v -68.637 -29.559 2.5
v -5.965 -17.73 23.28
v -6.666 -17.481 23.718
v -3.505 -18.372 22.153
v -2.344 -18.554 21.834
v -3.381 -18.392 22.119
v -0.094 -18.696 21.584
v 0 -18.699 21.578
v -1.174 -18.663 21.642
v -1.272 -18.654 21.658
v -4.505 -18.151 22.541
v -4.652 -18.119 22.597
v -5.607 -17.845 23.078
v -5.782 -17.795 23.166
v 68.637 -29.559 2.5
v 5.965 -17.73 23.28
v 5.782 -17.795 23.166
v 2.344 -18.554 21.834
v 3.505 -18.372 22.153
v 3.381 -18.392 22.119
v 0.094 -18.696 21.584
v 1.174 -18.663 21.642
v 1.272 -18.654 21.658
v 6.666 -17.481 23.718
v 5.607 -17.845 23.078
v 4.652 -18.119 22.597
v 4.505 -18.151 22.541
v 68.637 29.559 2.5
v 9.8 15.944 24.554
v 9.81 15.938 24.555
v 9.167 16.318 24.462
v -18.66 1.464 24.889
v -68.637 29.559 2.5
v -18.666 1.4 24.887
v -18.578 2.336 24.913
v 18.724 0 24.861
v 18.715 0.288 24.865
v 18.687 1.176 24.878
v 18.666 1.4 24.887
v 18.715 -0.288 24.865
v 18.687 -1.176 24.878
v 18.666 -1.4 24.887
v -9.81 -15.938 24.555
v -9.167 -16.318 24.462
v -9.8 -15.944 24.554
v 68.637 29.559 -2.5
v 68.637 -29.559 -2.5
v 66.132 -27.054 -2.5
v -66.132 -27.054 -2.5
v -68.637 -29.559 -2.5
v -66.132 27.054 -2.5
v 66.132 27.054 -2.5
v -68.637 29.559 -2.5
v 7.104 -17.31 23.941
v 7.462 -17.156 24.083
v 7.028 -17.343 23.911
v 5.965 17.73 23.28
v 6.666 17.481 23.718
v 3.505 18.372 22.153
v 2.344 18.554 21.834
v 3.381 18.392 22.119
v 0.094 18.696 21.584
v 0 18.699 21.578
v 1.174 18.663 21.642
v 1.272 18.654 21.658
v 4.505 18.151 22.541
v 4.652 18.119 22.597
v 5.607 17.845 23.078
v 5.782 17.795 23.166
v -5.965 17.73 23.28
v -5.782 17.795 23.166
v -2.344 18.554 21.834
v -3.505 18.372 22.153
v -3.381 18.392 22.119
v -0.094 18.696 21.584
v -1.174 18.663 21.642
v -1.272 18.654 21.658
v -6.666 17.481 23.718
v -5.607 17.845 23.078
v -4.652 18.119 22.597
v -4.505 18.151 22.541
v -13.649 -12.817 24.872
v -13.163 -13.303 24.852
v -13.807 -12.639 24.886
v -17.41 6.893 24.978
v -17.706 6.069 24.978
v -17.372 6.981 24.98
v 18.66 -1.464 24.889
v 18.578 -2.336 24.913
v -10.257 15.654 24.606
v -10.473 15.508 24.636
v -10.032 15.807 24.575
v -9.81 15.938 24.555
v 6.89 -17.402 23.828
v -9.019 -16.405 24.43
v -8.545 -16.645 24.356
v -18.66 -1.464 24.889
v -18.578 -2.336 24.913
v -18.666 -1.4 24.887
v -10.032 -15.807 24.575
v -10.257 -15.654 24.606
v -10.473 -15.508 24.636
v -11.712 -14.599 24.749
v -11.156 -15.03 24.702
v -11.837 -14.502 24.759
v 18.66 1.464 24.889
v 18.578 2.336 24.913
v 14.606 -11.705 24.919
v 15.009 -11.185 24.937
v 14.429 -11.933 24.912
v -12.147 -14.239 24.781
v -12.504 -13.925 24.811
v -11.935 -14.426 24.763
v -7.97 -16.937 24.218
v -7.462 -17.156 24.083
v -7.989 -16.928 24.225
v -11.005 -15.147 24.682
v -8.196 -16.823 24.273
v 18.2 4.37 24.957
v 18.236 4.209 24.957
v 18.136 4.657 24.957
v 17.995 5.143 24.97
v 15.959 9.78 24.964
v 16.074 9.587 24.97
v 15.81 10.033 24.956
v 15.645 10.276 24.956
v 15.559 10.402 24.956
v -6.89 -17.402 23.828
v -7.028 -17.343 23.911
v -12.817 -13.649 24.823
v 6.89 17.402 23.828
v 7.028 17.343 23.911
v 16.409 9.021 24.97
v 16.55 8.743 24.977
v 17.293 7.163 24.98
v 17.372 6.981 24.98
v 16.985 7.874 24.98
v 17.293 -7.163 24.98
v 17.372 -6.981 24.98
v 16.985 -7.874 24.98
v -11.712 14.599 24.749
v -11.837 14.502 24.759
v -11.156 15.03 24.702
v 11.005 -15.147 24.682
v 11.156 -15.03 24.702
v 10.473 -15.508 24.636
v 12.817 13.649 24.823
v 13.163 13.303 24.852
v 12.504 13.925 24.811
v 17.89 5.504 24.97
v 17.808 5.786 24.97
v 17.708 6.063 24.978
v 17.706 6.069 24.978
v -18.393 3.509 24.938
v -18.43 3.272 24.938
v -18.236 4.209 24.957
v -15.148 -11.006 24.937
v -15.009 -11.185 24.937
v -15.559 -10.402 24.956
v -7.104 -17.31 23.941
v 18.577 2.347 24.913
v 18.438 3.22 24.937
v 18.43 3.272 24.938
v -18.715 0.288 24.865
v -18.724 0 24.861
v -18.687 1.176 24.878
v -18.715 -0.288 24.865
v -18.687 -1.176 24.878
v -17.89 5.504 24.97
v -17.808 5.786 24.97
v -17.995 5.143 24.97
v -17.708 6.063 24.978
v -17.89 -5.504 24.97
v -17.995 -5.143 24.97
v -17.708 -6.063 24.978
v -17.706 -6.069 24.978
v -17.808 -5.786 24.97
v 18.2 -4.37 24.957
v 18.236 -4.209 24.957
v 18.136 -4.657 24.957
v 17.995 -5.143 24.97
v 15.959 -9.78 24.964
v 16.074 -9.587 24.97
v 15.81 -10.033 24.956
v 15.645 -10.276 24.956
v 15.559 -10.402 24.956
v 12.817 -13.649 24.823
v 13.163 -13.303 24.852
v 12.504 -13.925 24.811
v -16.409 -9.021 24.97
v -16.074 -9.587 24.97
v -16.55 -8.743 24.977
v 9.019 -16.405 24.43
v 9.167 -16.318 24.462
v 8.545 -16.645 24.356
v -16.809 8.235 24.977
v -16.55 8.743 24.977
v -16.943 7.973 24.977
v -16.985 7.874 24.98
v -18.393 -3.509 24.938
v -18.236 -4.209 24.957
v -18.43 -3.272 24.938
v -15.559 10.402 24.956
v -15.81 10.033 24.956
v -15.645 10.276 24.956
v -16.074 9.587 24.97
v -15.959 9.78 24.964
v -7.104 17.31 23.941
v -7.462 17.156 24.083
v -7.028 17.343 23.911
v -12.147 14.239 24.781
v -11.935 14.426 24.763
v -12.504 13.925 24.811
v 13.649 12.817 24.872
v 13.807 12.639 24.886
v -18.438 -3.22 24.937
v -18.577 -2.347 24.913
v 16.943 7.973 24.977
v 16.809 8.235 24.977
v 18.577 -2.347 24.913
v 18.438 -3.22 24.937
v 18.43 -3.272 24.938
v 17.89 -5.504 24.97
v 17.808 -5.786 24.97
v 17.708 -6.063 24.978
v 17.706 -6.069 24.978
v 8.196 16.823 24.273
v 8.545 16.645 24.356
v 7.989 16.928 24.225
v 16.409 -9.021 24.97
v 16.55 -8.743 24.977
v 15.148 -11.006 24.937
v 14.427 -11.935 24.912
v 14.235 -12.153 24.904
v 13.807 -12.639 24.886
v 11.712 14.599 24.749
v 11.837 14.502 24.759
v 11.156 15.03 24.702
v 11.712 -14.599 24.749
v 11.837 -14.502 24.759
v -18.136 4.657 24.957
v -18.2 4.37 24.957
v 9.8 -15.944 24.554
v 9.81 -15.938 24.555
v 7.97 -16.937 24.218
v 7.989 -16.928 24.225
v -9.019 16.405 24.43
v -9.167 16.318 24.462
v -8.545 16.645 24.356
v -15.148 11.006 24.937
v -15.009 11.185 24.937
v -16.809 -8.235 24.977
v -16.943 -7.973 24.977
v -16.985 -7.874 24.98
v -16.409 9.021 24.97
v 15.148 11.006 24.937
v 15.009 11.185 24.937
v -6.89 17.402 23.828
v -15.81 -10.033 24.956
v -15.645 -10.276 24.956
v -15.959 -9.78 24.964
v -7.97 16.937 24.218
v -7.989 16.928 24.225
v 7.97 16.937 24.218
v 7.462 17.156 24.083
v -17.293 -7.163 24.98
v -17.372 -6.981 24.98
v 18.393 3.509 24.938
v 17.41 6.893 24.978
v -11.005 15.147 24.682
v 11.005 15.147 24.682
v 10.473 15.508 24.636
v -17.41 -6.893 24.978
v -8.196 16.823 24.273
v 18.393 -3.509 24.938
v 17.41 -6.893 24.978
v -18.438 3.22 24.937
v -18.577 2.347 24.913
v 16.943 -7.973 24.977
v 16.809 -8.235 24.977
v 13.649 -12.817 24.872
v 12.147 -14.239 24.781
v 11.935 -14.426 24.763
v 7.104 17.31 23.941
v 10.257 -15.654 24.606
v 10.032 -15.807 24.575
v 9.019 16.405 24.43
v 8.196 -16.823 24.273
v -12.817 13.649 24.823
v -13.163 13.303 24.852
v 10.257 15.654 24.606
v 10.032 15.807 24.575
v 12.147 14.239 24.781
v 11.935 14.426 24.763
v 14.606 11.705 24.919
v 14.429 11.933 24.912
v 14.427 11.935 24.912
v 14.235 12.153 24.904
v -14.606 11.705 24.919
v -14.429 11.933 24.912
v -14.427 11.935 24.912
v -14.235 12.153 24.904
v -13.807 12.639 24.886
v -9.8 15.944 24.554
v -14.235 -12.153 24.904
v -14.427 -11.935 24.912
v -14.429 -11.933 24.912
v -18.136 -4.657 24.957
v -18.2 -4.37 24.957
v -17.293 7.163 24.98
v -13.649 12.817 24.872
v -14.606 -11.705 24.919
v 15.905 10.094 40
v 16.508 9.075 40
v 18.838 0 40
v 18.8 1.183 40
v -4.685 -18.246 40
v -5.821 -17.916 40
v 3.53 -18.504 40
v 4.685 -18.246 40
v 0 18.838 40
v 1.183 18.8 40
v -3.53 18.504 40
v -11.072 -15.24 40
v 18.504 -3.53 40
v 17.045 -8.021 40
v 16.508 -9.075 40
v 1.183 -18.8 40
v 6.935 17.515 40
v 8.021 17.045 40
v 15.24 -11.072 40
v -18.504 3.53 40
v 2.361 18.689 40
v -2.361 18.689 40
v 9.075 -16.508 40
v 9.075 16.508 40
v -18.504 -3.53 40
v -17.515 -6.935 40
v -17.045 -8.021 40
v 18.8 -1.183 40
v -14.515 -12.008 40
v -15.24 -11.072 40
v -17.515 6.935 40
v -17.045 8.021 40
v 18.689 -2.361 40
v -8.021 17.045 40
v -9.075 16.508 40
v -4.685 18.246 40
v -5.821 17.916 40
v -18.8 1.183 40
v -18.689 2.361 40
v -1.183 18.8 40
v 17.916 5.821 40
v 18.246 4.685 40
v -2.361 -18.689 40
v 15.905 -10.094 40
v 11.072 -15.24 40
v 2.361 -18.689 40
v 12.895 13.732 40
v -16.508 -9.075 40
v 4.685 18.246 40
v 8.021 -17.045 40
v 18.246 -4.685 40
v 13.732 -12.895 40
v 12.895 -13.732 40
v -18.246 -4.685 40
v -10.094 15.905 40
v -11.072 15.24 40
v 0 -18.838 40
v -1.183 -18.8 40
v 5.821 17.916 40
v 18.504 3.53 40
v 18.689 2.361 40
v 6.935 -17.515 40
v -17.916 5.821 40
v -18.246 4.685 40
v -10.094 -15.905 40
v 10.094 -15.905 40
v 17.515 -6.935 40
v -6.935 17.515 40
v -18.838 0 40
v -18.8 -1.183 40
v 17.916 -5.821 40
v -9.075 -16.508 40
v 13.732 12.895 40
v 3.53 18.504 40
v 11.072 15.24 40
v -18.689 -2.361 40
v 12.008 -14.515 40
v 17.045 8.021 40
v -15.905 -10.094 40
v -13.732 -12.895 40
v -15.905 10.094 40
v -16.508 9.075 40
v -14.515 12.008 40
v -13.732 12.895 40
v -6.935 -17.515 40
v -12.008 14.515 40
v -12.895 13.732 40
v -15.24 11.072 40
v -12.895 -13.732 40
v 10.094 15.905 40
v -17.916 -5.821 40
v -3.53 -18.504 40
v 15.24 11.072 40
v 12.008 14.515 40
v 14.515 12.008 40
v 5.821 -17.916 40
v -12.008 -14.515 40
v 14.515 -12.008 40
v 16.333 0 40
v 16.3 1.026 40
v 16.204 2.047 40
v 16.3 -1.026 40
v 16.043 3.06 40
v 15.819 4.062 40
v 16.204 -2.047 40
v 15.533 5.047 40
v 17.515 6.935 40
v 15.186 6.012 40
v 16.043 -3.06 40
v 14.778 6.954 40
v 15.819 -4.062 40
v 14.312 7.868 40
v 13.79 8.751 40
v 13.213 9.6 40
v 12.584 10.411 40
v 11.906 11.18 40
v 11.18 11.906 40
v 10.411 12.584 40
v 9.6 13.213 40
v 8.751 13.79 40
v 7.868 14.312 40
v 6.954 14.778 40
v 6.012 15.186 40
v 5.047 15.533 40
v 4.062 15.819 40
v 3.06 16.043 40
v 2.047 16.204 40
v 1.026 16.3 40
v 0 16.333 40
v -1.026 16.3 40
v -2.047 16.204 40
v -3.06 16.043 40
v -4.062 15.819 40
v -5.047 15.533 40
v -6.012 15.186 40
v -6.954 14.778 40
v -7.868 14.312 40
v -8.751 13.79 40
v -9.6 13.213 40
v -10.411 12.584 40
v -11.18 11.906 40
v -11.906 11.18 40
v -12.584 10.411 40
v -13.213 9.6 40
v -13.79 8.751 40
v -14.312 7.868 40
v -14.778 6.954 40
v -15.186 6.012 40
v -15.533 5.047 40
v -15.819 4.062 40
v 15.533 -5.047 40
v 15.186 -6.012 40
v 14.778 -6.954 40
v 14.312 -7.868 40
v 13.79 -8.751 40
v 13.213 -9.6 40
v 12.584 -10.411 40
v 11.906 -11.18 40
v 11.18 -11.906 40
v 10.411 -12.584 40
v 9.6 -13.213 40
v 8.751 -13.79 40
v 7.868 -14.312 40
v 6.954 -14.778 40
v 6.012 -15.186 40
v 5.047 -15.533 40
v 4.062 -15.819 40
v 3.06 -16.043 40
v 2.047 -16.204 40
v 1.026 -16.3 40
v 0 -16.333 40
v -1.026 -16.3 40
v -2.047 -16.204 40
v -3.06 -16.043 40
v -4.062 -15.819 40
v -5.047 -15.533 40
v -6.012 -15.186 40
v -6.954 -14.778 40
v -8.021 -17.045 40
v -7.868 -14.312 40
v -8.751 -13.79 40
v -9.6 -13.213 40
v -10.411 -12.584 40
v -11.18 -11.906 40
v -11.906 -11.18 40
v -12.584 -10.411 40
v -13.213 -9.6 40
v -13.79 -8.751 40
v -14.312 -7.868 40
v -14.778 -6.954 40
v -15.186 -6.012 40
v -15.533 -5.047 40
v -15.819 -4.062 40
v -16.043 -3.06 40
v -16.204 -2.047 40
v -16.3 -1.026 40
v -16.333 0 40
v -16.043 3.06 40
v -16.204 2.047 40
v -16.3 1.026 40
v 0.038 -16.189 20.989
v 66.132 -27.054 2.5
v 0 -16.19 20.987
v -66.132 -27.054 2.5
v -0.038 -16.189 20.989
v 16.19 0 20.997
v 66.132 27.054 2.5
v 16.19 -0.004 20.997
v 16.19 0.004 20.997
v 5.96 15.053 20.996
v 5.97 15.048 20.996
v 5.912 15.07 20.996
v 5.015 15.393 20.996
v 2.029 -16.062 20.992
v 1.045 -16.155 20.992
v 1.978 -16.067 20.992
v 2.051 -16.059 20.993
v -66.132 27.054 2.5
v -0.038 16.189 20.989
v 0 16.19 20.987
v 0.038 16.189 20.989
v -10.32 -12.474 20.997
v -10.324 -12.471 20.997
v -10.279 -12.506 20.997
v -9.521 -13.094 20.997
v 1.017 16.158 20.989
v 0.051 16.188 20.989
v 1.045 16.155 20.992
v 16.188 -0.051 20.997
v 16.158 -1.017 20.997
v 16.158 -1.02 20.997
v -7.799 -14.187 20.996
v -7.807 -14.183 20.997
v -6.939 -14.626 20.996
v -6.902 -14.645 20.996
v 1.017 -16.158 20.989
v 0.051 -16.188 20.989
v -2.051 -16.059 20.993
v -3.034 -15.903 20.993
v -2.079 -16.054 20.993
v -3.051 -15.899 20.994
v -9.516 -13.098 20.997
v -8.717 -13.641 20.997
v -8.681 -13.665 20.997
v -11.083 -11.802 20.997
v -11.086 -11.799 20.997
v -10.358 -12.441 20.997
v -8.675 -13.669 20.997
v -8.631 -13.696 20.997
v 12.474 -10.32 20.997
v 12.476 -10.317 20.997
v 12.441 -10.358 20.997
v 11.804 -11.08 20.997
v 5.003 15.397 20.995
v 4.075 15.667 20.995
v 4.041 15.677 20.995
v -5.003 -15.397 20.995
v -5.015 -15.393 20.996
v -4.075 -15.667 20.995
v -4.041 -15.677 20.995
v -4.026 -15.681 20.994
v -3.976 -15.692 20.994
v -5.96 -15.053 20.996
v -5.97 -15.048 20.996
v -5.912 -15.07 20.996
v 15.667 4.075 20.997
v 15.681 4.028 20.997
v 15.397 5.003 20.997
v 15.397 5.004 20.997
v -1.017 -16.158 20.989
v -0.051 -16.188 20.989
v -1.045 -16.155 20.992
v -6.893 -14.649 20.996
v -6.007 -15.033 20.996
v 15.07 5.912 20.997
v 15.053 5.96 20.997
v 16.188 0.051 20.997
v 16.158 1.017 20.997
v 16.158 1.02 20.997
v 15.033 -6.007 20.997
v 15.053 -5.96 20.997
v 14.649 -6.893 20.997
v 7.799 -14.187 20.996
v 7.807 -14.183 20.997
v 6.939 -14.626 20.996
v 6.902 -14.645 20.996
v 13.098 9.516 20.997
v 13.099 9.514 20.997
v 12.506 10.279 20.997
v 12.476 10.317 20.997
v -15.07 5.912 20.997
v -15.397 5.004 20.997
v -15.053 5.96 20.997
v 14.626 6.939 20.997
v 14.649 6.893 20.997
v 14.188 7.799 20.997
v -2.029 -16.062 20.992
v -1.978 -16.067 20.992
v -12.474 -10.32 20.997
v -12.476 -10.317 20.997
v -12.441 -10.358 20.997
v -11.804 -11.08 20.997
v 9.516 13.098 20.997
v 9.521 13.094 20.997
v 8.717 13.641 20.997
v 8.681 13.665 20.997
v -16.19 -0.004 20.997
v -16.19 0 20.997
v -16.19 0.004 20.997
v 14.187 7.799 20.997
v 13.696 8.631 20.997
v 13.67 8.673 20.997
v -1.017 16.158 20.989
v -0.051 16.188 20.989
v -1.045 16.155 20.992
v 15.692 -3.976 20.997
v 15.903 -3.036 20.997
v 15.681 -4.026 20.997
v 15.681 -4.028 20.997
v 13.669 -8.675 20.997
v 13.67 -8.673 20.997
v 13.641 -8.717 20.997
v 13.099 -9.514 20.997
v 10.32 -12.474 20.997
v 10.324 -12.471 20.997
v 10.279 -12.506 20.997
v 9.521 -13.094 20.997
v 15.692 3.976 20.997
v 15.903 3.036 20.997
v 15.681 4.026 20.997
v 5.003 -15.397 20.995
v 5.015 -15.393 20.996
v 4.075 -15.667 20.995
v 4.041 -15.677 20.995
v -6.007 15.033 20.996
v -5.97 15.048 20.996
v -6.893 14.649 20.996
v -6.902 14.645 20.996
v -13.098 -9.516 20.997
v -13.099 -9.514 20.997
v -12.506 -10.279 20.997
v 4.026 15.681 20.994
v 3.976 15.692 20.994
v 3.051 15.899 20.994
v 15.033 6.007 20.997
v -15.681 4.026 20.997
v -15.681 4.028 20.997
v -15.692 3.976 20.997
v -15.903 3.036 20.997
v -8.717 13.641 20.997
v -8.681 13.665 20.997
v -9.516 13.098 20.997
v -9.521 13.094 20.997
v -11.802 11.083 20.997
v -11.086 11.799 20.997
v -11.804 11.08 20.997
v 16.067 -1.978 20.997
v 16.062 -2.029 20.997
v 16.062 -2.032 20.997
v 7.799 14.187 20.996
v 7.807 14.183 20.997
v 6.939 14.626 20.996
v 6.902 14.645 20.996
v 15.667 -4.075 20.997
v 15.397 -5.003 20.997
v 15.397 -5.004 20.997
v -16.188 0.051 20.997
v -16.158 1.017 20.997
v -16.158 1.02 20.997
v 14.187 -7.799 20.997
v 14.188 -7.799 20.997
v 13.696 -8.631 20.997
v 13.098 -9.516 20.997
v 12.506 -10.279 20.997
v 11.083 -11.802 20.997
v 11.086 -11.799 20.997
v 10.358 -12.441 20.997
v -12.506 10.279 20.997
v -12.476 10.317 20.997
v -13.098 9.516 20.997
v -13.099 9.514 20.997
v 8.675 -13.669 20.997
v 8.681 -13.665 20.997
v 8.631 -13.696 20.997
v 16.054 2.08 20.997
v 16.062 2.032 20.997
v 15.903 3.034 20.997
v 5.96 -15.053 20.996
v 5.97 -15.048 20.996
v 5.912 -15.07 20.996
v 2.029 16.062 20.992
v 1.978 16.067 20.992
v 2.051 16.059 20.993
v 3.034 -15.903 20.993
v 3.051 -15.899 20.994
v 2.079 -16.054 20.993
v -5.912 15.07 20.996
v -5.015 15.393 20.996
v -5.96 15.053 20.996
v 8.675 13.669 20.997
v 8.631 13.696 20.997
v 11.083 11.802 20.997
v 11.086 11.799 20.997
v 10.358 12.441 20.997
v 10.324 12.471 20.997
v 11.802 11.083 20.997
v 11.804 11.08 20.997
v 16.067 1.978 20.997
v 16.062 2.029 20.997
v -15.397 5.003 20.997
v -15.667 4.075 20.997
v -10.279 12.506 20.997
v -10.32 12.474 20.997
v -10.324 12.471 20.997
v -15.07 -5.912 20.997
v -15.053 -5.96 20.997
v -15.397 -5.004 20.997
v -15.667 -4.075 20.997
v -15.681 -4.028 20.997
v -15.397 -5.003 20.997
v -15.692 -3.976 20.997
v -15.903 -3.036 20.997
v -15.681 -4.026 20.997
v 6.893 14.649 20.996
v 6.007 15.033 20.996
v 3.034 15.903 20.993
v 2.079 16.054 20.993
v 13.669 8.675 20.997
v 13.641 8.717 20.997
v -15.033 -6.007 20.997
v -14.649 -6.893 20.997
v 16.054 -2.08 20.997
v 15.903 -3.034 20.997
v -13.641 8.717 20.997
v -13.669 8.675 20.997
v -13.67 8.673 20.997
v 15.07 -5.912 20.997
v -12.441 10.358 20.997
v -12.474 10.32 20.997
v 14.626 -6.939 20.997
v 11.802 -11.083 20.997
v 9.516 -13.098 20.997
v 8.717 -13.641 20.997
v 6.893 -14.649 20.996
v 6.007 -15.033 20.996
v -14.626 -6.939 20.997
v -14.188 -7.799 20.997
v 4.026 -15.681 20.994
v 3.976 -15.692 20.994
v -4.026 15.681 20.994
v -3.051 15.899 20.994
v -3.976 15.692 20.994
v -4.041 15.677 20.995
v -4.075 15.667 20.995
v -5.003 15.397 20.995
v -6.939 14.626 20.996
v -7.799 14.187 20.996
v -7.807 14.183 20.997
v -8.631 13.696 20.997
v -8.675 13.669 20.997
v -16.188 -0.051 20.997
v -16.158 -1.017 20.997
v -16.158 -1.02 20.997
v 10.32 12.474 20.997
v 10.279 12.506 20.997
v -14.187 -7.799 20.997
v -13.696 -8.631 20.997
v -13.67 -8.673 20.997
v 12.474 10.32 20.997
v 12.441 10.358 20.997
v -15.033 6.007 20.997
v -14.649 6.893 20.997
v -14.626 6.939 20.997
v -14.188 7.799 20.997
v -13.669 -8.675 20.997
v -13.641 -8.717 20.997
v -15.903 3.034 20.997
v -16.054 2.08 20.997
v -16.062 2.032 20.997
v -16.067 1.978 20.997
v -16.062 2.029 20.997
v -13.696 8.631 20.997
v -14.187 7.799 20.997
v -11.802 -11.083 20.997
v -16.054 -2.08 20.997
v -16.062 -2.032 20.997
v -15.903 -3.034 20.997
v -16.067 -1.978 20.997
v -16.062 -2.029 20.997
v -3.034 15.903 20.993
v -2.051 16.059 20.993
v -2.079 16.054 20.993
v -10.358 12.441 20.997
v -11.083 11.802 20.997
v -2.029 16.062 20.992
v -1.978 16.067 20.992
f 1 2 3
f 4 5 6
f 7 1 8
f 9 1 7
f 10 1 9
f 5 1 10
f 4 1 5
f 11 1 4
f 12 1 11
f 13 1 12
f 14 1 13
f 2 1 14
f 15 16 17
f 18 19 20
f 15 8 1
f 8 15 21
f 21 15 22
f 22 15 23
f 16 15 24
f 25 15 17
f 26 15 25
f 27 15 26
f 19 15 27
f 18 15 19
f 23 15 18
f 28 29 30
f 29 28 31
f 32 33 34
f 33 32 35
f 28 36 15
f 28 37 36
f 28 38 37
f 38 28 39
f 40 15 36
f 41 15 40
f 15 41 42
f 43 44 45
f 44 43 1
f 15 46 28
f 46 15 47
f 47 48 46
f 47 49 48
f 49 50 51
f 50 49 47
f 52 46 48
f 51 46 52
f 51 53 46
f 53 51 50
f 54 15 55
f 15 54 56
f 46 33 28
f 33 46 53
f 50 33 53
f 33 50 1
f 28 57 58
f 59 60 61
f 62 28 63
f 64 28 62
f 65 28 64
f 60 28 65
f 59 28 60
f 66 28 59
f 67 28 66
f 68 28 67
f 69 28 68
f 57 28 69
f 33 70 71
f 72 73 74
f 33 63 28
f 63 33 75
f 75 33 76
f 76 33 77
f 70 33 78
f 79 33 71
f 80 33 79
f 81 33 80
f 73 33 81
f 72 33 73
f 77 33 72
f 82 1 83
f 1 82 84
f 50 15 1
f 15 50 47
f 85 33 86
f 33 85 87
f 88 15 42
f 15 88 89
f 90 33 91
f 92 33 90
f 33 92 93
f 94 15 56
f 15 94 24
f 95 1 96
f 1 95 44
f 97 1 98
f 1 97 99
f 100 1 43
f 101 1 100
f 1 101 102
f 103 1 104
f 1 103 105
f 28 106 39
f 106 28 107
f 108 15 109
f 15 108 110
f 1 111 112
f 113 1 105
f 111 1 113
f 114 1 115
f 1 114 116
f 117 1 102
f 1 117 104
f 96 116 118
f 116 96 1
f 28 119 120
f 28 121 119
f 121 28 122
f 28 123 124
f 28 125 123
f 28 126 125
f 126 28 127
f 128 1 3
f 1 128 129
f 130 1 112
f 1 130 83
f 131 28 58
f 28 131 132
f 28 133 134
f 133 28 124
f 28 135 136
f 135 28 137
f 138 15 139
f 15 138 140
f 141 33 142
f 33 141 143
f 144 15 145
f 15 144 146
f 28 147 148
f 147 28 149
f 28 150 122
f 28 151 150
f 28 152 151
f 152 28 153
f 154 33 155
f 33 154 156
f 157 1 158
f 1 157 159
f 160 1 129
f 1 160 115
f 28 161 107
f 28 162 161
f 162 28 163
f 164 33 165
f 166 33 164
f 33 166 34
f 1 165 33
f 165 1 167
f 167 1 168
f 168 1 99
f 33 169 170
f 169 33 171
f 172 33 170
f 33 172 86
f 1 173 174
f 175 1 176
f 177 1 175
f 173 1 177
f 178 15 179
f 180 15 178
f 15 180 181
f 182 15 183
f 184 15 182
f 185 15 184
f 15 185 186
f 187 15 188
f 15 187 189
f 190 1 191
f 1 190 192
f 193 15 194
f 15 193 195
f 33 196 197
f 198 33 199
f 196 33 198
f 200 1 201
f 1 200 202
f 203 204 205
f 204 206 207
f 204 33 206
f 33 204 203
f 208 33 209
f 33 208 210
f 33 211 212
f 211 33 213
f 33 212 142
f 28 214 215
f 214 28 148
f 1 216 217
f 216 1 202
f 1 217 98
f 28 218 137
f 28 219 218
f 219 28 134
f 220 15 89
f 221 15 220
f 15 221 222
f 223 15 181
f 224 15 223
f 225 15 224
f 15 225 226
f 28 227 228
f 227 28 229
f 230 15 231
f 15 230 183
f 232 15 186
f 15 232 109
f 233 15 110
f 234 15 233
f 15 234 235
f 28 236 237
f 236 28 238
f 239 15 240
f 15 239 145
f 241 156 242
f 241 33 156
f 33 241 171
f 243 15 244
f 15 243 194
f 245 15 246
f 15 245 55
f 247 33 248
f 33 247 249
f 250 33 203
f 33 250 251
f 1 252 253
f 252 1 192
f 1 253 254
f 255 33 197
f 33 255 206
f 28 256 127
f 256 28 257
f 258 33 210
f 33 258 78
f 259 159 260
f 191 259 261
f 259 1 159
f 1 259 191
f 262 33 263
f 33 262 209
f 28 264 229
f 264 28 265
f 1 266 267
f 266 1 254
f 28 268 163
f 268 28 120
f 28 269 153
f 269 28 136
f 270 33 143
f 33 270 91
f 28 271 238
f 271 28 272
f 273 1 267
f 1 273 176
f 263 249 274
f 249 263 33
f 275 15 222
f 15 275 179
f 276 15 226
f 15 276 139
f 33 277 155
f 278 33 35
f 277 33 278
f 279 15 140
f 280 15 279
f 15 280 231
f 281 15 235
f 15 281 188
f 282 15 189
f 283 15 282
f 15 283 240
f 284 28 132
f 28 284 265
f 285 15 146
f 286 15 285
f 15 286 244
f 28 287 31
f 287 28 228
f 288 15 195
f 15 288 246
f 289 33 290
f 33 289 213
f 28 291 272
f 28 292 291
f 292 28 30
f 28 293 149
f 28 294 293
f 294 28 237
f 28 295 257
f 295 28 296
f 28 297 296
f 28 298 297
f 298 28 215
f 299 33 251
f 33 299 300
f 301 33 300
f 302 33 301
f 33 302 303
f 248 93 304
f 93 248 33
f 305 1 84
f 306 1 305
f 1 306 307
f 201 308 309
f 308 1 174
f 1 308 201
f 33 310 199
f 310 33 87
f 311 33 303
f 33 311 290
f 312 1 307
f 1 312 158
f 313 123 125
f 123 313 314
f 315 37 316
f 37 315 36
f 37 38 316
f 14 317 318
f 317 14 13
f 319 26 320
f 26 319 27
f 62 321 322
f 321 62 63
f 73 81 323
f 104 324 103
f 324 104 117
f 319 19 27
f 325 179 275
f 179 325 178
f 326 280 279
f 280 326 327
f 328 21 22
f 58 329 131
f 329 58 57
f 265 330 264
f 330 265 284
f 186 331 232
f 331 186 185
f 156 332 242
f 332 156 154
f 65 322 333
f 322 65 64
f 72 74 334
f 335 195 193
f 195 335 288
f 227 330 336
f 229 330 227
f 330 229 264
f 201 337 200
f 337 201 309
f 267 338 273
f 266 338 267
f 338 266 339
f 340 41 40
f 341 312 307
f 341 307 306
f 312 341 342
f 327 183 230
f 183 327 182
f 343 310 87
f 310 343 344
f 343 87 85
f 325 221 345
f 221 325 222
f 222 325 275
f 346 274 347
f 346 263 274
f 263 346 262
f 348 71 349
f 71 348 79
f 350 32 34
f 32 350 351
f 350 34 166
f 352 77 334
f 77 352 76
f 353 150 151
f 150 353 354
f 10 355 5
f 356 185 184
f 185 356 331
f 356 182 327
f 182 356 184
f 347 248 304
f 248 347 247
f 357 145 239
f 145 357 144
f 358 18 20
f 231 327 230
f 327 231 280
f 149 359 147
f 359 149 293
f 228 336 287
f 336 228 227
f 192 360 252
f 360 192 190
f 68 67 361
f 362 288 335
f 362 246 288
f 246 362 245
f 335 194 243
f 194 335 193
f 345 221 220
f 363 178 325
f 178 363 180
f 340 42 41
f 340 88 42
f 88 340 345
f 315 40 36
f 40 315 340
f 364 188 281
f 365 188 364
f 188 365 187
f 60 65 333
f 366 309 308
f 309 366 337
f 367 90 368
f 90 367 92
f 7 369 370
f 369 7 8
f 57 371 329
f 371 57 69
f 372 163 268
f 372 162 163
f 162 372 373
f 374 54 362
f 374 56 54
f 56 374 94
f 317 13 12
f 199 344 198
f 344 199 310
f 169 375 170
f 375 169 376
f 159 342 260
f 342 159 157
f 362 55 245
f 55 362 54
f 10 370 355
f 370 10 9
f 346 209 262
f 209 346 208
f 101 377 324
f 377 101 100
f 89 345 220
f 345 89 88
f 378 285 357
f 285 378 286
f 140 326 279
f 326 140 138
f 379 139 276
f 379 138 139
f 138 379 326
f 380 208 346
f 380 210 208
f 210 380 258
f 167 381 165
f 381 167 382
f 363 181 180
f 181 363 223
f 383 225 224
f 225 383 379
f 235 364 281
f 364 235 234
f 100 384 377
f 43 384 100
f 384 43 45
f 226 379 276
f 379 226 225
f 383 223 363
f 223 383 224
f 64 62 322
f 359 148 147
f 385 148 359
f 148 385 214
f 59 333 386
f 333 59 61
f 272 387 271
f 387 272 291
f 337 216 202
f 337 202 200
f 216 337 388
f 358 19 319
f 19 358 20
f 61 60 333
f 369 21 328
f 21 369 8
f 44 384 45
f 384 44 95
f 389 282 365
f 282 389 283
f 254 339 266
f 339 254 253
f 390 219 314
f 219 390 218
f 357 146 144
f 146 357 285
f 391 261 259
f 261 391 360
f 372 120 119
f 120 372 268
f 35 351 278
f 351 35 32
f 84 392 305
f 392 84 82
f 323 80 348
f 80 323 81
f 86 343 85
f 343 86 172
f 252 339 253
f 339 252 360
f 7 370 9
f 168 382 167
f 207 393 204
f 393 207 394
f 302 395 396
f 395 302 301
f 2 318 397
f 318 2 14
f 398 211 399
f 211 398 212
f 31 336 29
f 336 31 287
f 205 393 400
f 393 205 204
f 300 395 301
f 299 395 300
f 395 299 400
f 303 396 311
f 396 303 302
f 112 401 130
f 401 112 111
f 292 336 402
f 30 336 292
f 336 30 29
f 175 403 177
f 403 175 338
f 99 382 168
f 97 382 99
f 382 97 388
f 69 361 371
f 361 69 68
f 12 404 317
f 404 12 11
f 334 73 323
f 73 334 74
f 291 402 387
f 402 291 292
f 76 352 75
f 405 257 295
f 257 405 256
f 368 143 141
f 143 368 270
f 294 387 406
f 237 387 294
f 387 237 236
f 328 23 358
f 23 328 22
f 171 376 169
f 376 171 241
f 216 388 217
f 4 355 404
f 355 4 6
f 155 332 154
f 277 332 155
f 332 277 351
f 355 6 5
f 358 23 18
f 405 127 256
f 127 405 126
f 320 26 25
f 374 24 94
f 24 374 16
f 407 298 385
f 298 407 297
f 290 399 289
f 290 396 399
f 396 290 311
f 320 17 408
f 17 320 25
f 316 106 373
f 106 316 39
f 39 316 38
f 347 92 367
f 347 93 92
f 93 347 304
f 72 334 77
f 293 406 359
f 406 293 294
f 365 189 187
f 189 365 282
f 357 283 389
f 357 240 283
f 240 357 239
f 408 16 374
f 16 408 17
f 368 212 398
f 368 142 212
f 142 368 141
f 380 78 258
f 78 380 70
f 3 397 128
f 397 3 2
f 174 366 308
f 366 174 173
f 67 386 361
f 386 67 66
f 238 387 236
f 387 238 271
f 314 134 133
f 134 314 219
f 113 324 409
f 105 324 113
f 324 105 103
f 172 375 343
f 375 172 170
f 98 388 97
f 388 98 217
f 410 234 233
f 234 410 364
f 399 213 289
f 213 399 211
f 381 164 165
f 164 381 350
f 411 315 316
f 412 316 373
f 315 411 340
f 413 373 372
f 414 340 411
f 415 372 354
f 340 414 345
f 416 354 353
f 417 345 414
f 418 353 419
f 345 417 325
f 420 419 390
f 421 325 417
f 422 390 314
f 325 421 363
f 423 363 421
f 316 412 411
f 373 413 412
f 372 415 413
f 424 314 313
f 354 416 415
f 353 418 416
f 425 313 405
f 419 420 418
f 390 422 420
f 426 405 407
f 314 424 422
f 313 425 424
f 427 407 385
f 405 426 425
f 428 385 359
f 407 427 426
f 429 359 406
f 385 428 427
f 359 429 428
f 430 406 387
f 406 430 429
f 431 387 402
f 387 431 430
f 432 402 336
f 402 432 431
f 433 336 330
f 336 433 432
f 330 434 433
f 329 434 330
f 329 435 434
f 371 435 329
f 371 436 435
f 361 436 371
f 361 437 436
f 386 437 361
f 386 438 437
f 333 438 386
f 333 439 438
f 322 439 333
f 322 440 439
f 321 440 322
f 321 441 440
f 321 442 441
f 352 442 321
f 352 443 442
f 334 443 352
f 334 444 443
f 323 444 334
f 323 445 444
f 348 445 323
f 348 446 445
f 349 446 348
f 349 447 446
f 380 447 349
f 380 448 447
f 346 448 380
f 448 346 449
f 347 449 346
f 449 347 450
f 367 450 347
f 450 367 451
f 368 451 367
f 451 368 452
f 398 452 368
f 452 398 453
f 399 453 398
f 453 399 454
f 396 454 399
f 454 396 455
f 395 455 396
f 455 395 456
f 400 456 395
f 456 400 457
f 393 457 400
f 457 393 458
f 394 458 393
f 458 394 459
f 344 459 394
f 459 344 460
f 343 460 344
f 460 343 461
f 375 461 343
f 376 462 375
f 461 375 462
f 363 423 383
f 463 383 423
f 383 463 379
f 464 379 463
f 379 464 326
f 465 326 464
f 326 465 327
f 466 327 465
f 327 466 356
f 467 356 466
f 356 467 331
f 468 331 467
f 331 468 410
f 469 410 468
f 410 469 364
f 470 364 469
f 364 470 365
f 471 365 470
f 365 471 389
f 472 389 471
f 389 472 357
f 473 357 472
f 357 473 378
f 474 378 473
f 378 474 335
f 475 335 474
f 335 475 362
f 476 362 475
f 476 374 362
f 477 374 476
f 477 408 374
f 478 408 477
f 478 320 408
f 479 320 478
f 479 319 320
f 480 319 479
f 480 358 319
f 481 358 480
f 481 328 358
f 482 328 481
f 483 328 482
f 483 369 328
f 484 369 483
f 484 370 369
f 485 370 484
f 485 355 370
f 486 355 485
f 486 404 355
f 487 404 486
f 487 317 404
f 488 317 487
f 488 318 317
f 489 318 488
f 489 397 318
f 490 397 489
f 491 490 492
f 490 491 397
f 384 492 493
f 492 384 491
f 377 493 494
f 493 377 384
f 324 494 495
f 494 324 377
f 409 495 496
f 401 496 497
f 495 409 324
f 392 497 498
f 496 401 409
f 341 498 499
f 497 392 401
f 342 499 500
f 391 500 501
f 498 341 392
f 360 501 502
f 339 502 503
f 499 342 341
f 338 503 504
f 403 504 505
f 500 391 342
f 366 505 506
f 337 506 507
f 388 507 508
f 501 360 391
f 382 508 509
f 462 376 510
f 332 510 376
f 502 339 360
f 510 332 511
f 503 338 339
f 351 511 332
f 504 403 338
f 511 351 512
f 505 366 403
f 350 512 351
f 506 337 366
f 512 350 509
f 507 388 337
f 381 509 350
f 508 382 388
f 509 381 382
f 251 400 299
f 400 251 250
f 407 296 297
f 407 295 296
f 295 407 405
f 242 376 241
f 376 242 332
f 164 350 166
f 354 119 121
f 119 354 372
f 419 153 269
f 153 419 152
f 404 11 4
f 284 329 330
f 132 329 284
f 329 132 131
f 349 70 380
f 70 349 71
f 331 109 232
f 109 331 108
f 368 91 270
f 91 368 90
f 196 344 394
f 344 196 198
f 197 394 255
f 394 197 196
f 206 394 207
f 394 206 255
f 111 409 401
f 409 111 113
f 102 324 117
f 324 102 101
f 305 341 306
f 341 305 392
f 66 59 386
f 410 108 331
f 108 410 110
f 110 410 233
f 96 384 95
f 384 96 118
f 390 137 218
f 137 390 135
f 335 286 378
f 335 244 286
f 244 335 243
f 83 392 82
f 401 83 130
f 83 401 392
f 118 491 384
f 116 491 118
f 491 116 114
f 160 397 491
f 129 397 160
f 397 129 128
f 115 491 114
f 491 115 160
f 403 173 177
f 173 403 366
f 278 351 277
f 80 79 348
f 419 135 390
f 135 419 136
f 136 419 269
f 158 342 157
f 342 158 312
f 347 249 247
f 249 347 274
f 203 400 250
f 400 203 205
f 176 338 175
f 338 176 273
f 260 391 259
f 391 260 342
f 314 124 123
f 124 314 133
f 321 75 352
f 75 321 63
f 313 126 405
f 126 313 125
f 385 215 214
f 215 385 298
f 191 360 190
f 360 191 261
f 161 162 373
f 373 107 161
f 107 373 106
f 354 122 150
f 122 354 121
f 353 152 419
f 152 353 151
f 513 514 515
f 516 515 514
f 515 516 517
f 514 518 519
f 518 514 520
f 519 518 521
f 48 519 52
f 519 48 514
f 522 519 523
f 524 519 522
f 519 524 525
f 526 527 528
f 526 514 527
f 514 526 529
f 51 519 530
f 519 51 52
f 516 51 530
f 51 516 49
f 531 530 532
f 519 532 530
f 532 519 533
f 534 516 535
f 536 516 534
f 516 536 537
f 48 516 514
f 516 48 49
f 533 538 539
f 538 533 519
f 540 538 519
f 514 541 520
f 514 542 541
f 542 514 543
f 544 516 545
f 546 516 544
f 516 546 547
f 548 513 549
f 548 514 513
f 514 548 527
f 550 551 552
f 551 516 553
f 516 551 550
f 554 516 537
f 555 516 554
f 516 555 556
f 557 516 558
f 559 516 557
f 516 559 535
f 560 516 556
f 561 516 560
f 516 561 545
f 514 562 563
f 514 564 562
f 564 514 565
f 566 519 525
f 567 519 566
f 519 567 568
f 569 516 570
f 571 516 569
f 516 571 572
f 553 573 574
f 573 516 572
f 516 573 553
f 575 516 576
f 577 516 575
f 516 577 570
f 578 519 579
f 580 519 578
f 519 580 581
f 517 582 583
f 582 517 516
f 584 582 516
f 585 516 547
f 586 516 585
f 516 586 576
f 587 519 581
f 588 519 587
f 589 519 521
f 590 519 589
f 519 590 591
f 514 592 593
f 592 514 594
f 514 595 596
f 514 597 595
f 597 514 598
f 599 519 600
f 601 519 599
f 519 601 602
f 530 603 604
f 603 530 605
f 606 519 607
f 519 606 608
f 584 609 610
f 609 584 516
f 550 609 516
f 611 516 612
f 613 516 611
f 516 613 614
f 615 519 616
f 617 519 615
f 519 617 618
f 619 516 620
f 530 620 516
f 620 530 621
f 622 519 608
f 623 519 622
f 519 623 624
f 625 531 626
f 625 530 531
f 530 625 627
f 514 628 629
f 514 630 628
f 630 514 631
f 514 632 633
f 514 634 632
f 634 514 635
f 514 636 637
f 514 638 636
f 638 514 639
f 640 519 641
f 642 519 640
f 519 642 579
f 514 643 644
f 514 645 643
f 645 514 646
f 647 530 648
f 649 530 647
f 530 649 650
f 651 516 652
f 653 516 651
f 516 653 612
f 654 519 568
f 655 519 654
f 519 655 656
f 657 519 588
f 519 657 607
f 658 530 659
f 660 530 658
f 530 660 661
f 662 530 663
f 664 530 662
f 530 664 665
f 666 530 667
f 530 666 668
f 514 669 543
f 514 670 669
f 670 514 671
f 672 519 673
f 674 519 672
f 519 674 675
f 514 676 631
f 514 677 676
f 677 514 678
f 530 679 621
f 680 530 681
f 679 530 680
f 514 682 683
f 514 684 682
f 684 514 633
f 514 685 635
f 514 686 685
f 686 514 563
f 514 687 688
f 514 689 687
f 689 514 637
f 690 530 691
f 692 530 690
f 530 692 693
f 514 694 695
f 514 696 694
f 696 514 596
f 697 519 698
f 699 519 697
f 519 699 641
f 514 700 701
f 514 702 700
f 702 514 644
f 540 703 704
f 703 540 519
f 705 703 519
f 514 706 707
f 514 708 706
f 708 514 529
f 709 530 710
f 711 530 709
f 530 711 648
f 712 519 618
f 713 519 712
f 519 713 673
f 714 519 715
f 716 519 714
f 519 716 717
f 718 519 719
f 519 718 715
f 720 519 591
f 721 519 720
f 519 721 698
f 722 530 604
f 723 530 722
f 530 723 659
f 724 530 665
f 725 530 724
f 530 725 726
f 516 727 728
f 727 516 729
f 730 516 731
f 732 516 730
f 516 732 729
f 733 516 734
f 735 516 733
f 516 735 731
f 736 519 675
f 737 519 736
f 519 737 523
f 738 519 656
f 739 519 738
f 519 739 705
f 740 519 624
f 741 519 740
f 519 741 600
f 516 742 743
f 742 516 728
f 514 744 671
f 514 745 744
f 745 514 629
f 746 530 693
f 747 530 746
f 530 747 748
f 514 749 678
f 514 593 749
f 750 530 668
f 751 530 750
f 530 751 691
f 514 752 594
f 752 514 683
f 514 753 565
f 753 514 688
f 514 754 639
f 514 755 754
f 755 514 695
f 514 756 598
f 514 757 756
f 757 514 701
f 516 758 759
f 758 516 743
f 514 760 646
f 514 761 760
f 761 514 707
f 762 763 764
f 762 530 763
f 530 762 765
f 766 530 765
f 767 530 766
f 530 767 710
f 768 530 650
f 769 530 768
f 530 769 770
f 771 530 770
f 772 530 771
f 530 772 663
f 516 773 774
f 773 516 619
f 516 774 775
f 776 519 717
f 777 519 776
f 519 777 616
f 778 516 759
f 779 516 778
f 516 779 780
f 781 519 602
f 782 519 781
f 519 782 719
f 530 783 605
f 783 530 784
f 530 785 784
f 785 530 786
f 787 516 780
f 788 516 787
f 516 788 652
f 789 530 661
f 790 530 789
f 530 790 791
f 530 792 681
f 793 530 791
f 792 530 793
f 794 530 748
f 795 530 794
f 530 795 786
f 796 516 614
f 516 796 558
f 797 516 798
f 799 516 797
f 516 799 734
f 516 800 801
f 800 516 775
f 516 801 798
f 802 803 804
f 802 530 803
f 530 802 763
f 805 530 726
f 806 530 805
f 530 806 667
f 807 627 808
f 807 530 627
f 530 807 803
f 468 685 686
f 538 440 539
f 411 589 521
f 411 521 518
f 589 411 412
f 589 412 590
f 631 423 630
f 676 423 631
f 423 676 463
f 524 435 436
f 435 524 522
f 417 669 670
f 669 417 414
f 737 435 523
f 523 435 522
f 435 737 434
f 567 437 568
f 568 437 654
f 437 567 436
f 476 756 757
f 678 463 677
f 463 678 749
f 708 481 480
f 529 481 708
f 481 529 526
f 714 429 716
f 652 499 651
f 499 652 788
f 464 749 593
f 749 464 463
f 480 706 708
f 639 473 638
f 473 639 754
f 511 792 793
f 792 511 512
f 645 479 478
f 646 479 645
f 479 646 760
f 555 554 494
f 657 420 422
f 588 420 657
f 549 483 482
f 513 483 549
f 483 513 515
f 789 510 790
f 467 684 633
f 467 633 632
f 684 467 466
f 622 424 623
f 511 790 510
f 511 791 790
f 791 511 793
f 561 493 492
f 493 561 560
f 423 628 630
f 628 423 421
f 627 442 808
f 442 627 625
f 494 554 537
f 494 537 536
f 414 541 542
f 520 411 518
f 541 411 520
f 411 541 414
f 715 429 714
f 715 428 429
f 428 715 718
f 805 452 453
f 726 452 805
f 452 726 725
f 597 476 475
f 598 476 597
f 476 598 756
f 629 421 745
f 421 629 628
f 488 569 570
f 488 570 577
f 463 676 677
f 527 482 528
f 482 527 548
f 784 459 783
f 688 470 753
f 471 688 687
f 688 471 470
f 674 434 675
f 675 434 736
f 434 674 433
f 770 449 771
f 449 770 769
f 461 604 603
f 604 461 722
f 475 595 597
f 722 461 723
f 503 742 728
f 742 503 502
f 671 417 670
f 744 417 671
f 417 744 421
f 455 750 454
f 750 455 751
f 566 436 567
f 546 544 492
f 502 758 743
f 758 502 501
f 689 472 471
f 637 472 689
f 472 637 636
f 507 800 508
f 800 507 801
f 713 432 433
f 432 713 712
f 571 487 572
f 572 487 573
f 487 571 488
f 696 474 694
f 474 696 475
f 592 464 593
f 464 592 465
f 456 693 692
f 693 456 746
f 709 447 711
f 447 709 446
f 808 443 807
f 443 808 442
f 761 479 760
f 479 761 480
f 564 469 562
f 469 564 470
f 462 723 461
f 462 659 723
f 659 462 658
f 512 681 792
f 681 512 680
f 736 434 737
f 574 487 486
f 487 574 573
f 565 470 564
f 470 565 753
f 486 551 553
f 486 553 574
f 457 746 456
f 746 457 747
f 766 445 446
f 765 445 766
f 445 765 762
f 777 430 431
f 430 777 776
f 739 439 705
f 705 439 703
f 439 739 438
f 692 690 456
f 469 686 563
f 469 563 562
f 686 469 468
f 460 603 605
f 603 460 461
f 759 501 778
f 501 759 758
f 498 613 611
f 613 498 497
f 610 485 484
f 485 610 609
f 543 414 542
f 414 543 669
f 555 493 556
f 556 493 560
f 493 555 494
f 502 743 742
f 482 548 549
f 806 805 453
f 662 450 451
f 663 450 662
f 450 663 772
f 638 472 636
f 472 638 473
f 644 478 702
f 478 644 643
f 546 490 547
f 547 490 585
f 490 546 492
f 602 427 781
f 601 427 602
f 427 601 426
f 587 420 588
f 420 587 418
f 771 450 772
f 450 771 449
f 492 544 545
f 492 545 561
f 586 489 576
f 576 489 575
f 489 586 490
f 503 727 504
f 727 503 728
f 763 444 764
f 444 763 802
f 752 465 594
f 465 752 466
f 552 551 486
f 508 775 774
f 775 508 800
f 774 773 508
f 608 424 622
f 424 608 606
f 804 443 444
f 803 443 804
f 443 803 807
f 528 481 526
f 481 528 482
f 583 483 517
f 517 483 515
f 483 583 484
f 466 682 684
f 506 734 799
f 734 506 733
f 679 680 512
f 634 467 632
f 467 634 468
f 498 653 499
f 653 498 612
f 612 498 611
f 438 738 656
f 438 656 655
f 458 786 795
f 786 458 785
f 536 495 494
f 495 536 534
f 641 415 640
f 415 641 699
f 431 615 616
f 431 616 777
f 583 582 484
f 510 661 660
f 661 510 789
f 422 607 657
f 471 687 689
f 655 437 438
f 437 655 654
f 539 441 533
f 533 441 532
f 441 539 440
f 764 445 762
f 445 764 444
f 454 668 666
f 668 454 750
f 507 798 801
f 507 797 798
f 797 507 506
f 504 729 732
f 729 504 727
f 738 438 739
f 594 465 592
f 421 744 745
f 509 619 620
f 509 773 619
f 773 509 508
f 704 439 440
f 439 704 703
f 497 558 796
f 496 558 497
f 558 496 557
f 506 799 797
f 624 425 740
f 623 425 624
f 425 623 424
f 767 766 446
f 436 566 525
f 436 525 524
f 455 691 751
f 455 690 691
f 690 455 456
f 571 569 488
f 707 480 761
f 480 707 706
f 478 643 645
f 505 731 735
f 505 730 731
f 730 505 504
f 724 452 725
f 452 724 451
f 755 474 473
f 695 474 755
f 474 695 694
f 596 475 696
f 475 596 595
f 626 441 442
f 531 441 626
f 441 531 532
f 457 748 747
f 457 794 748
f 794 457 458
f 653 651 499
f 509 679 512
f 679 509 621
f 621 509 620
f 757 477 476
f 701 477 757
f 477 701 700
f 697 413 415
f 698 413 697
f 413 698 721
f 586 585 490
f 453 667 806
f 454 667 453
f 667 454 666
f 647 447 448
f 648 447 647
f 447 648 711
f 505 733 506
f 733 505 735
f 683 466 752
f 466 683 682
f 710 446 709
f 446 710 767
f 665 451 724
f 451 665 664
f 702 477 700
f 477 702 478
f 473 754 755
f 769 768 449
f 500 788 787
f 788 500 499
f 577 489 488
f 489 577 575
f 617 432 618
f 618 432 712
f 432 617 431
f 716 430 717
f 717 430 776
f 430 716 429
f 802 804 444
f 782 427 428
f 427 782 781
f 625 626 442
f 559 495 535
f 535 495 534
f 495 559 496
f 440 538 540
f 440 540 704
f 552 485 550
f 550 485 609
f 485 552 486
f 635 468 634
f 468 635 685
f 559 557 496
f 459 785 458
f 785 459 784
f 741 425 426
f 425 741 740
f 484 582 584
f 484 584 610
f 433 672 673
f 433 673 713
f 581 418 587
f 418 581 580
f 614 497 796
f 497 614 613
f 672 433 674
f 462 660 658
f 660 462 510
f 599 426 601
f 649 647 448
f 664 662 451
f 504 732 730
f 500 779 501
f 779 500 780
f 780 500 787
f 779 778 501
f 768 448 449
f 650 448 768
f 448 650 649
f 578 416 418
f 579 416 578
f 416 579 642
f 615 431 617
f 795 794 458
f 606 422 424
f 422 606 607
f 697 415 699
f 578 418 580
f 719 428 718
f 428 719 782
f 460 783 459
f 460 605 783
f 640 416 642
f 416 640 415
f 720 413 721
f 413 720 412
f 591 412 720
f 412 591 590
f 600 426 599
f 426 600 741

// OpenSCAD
$fn=100;

d1 = 32.3;
d2 = 32.6; 
h1 = 20;

x1 = 132;
y1 = 54;



//module b1() {
//hull() {
//    cube([x1,y1,5], center =true);
//    translate([0,0,20])
//    cylinder(d=d1, h=1);
//}
//
//translate([0,0,20])
//cylinder(d=d1, h=10);
//
//}


module b2(offs=0) {

    hull() {
        cube([x1+offs,y1+offs,5], center =true);
        translate([0,0,1*h1 + offs])
        cylinder(d=d1, h=1);
        }

    translate([0,0,h1])
    cylinder(d1=d1 + offs, d2=d2 + offs, h=h1);

}


scale([1.002, 1.002, 1]) // 0.2% shrinkage
difference() {
b2(offs=5);
b2(offs=0);
}
